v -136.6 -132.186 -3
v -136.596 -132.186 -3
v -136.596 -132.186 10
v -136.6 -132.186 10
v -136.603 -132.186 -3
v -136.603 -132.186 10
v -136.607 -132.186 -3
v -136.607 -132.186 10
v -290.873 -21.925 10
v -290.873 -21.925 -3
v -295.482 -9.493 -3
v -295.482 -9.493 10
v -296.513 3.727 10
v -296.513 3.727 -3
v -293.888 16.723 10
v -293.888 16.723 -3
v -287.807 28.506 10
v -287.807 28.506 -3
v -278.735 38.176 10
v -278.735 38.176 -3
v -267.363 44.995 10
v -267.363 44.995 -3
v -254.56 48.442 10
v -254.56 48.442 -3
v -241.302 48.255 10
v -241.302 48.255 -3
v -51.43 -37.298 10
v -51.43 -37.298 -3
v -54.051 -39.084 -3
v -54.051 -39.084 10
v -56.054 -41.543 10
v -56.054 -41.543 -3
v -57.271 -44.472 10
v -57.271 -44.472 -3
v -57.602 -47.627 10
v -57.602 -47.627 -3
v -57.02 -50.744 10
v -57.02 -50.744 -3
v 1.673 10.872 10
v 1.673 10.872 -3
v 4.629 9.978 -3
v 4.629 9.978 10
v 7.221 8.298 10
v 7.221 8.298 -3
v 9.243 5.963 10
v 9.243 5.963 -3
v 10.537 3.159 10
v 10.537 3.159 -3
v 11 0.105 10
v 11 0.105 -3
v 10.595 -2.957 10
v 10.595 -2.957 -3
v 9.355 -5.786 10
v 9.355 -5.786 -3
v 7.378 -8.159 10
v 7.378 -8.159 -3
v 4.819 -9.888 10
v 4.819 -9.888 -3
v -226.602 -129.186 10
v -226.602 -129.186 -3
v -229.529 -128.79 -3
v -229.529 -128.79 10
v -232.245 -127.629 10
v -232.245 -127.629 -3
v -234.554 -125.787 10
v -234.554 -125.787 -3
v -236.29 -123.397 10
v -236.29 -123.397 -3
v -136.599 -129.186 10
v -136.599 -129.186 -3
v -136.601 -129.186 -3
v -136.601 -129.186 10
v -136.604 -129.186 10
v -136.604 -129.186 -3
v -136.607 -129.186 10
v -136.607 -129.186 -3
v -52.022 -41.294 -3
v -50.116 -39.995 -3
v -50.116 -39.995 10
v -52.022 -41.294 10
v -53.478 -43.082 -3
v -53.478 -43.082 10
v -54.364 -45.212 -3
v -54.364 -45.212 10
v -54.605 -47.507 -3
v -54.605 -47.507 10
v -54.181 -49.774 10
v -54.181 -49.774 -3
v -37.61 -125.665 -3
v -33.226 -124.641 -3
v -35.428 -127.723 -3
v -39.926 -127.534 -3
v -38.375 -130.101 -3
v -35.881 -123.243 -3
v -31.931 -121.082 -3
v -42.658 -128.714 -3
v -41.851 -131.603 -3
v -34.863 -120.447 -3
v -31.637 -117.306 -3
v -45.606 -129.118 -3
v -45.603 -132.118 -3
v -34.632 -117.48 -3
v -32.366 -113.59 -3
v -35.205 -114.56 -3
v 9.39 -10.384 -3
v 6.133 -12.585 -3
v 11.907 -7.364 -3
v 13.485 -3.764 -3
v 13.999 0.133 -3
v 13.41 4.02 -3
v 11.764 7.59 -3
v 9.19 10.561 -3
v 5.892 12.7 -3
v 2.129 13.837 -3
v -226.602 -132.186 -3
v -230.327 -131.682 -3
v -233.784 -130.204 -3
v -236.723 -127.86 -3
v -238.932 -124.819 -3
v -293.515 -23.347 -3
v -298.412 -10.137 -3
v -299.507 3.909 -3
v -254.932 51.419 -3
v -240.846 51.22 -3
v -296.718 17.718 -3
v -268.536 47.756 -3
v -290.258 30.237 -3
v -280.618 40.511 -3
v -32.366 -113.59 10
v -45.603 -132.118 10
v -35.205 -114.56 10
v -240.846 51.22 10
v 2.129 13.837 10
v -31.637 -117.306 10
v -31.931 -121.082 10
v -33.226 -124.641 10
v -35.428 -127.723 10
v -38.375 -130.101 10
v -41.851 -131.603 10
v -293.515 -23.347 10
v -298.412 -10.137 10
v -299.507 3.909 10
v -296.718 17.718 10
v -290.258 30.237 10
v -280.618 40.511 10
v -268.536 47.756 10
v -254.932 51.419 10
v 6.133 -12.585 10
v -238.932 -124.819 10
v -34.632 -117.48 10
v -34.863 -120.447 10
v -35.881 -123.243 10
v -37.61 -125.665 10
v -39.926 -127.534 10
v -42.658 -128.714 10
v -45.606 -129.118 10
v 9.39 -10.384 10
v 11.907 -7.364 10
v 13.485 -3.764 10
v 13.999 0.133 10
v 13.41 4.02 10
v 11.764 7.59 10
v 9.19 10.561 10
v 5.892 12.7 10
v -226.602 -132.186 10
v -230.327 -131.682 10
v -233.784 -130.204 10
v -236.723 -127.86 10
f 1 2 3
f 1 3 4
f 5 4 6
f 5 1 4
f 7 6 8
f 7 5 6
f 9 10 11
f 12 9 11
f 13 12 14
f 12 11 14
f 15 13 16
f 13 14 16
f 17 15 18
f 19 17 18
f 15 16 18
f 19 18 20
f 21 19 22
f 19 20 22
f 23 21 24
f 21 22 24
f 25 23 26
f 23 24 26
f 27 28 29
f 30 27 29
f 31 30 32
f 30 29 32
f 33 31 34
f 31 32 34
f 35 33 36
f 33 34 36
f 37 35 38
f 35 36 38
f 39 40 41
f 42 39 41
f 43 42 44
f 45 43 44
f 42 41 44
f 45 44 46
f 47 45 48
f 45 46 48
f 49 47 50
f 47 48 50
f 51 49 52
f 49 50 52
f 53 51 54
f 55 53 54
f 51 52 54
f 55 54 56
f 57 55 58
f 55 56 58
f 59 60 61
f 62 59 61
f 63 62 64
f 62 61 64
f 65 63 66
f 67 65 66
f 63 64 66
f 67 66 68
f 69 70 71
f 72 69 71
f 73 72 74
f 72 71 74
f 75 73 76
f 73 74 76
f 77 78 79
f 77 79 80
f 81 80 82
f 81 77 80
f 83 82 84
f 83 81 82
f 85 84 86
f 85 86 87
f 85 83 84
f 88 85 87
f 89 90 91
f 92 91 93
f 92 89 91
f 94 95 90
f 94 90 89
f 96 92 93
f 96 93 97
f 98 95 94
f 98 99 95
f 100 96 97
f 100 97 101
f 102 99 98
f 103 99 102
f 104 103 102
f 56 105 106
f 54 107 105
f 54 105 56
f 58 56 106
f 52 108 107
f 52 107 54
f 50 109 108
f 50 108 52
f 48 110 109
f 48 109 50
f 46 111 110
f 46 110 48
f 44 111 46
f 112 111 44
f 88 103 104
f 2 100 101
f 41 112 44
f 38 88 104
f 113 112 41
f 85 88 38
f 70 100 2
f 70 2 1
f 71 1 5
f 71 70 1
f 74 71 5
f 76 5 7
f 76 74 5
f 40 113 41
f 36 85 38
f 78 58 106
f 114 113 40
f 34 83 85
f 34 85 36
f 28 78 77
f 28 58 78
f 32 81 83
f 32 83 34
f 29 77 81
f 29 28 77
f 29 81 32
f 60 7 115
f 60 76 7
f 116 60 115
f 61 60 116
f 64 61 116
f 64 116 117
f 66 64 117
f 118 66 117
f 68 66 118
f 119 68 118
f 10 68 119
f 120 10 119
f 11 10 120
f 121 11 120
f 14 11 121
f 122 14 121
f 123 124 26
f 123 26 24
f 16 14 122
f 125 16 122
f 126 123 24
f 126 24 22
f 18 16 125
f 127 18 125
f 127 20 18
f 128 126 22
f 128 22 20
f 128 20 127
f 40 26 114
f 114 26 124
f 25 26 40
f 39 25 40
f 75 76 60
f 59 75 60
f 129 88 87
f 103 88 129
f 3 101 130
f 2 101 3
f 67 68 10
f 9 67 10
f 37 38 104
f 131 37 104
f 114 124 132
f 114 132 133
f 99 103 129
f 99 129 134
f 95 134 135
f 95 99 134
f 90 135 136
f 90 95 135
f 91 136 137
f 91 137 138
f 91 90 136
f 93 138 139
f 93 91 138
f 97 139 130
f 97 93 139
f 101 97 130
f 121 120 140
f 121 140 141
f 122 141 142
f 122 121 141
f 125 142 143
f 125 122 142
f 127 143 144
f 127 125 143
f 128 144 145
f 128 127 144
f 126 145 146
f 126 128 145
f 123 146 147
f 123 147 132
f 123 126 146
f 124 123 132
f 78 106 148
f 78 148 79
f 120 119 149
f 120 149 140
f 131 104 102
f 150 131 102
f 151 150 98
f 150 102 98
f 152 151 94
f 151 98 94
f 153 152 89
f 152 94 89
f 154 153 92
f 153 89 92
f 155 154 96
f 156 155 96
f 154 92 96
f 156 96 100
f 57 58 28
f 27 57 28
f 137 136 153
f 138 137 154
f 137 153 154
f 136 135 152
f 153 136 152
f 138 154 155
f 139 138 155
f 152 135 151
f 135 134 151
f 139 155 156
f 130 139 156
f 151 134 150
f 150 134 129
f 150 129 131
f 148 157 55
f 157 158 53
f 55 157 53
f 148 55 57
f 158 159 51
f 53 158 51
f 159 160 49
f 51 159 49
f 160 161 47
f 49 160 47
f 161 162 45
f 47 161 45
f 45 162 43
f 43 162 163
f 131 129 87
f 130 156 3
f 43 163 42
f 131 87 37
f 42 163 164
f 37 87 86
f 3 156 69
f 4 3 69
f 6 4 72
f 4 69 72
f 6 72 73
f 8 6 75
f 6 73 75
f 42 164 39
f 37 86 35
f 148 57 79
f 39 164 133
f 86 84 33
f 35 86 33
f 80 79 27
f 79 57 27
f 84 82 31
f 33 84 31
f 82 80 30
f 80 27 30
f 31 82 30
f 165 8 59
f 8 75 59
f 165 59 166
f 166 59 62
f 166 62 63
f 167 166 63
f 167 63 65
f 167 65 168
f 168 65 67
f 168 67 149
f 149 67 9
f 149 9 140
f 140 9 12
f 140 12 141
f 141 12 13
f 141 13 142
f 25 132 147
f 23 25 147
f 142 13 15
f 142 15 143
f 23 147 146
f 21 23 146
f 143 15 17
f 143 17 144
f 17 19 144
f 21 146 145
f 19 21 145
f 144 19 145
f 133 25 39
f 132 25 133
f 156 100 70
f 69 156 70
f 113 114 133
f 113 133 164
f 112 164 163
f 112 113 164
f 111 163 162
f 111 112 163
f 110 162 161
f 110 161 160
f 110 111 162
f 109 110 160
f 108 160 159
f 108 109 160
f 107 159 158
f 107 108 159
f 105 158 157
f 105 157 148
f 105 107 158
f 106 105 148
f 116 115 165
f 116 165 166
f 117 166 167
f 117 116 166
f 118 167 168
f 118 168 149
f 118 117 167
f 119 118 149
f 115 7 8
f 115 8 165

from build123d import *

# Parameters (mm, degrees)
EXTRUDE_THIN1_DEPTH      = 10
EXTRUDE_THIN1_DEPTH_BACK = 3


with BuildPart() as part:
    # Sketch2 → Extrude-Thin1 (new, two sides: drawn at the far end of the back side and taken through both)
    with BuildSketch(Plane.XY.offset(-EXTRUDE_THIN1_DEPTH_BACK)):
        with BuildLine():
            Line((-240.84576429, 51.220485395), (2.128944074, 13.83718169))
            ThreePointArc((2.128944074, 13.83718169), (13.841987462, 2.097470641), (6.132730824, -12.585293506))
            Line((6.132730824, -12.585293506), (-50.115721031, -39.994794473))
            ThreePointArc((-50.115721031, -39.994794473), (-53.998383655, -44.115390019), (-54.18122983, -49.77409517))
            Line((-54.18122983, -49.77409517), (-32.366451516, -113.589833173))
            ThreePointArc((-32.366451516, -113.589833173), (-34.222214173, -126.256574565), (-45.603348876, -132.11831197))
            Line((-45.603348876, -132.11831197), (-136.596329555, -132.186386844))
            ThreePointArc((-136.596329554, -132.186386844), (-136.601566486, -132.186389782), (-136.606803418, -132.186390762))
            Line((-136.606803418, -132.186390762), (-226.602303418, -132.186390762))
            ThreePointArc((-226.602303418, -132.186390762), (-233.783844459, -130.204105531), (-238.931690823, -124.818600515))
            Line((-238.931690823, -124.818600515), (-293.515400395, -23.346583433))
            ThreePointArc((-293.515400395, -23.346583433), (-290.257598601, 30.23714982), (-240.84576429, 51.220485395))
        make_face()
        with BuildLine():
            Line((-241.301966592, 48.255375033), (1.672741773, 10.872071328))
            ThreePointArc((1.672741773, 10.872071328), (10.875847292, 1.648012647), (4.818574219, -9.888444898))
            Line((4.818574219, -9.888444898), (-51.429877637, -37.297945864))
            ThreePointArc((-51.429877637, -37.297945864), (-56.768538744, -42.963764741), (-57.019952235, -50.744484323))
            Line((-57.019952235, -50.744484323), (-35.205173921, -114.560222326))
            ThreePointArc((-35.205173921, -114.560222326), (-36.663273152, -124.512661991), (-45.605593275, -129.11831281))
            Line((-45.605593275, -129.11831281), (-136.598573954, -129.186387684))
            ThreePointArc((-136.598573954, -129.186387684), (-136.602688686, -129.186389992), (-136.606803418, -129.186390762))
            Line((-136.606803418, -129.186390762), (-226.602303418, -129.186390762))
            ThreePointArc((-226.602303418, -129.186390762), (-232.244942807, -127.628880938), (-236.289679236, -123.397412711))
            Line((-236.289679236, -123.397412711), (-290.873388808, -21.925395629))
            ThreePointArc((-290.873388808, -21.925395629), (-287.807222413, 28.506353315), (-241.301966592, 48.255375033))
        make_face(mode=Mode.SUBTRACT)
    extrude(amount=EXTRUDE_THIN1_DEPTH + EXTRUDE_THIN1_DEPTH_BACK)


solid = part.part
